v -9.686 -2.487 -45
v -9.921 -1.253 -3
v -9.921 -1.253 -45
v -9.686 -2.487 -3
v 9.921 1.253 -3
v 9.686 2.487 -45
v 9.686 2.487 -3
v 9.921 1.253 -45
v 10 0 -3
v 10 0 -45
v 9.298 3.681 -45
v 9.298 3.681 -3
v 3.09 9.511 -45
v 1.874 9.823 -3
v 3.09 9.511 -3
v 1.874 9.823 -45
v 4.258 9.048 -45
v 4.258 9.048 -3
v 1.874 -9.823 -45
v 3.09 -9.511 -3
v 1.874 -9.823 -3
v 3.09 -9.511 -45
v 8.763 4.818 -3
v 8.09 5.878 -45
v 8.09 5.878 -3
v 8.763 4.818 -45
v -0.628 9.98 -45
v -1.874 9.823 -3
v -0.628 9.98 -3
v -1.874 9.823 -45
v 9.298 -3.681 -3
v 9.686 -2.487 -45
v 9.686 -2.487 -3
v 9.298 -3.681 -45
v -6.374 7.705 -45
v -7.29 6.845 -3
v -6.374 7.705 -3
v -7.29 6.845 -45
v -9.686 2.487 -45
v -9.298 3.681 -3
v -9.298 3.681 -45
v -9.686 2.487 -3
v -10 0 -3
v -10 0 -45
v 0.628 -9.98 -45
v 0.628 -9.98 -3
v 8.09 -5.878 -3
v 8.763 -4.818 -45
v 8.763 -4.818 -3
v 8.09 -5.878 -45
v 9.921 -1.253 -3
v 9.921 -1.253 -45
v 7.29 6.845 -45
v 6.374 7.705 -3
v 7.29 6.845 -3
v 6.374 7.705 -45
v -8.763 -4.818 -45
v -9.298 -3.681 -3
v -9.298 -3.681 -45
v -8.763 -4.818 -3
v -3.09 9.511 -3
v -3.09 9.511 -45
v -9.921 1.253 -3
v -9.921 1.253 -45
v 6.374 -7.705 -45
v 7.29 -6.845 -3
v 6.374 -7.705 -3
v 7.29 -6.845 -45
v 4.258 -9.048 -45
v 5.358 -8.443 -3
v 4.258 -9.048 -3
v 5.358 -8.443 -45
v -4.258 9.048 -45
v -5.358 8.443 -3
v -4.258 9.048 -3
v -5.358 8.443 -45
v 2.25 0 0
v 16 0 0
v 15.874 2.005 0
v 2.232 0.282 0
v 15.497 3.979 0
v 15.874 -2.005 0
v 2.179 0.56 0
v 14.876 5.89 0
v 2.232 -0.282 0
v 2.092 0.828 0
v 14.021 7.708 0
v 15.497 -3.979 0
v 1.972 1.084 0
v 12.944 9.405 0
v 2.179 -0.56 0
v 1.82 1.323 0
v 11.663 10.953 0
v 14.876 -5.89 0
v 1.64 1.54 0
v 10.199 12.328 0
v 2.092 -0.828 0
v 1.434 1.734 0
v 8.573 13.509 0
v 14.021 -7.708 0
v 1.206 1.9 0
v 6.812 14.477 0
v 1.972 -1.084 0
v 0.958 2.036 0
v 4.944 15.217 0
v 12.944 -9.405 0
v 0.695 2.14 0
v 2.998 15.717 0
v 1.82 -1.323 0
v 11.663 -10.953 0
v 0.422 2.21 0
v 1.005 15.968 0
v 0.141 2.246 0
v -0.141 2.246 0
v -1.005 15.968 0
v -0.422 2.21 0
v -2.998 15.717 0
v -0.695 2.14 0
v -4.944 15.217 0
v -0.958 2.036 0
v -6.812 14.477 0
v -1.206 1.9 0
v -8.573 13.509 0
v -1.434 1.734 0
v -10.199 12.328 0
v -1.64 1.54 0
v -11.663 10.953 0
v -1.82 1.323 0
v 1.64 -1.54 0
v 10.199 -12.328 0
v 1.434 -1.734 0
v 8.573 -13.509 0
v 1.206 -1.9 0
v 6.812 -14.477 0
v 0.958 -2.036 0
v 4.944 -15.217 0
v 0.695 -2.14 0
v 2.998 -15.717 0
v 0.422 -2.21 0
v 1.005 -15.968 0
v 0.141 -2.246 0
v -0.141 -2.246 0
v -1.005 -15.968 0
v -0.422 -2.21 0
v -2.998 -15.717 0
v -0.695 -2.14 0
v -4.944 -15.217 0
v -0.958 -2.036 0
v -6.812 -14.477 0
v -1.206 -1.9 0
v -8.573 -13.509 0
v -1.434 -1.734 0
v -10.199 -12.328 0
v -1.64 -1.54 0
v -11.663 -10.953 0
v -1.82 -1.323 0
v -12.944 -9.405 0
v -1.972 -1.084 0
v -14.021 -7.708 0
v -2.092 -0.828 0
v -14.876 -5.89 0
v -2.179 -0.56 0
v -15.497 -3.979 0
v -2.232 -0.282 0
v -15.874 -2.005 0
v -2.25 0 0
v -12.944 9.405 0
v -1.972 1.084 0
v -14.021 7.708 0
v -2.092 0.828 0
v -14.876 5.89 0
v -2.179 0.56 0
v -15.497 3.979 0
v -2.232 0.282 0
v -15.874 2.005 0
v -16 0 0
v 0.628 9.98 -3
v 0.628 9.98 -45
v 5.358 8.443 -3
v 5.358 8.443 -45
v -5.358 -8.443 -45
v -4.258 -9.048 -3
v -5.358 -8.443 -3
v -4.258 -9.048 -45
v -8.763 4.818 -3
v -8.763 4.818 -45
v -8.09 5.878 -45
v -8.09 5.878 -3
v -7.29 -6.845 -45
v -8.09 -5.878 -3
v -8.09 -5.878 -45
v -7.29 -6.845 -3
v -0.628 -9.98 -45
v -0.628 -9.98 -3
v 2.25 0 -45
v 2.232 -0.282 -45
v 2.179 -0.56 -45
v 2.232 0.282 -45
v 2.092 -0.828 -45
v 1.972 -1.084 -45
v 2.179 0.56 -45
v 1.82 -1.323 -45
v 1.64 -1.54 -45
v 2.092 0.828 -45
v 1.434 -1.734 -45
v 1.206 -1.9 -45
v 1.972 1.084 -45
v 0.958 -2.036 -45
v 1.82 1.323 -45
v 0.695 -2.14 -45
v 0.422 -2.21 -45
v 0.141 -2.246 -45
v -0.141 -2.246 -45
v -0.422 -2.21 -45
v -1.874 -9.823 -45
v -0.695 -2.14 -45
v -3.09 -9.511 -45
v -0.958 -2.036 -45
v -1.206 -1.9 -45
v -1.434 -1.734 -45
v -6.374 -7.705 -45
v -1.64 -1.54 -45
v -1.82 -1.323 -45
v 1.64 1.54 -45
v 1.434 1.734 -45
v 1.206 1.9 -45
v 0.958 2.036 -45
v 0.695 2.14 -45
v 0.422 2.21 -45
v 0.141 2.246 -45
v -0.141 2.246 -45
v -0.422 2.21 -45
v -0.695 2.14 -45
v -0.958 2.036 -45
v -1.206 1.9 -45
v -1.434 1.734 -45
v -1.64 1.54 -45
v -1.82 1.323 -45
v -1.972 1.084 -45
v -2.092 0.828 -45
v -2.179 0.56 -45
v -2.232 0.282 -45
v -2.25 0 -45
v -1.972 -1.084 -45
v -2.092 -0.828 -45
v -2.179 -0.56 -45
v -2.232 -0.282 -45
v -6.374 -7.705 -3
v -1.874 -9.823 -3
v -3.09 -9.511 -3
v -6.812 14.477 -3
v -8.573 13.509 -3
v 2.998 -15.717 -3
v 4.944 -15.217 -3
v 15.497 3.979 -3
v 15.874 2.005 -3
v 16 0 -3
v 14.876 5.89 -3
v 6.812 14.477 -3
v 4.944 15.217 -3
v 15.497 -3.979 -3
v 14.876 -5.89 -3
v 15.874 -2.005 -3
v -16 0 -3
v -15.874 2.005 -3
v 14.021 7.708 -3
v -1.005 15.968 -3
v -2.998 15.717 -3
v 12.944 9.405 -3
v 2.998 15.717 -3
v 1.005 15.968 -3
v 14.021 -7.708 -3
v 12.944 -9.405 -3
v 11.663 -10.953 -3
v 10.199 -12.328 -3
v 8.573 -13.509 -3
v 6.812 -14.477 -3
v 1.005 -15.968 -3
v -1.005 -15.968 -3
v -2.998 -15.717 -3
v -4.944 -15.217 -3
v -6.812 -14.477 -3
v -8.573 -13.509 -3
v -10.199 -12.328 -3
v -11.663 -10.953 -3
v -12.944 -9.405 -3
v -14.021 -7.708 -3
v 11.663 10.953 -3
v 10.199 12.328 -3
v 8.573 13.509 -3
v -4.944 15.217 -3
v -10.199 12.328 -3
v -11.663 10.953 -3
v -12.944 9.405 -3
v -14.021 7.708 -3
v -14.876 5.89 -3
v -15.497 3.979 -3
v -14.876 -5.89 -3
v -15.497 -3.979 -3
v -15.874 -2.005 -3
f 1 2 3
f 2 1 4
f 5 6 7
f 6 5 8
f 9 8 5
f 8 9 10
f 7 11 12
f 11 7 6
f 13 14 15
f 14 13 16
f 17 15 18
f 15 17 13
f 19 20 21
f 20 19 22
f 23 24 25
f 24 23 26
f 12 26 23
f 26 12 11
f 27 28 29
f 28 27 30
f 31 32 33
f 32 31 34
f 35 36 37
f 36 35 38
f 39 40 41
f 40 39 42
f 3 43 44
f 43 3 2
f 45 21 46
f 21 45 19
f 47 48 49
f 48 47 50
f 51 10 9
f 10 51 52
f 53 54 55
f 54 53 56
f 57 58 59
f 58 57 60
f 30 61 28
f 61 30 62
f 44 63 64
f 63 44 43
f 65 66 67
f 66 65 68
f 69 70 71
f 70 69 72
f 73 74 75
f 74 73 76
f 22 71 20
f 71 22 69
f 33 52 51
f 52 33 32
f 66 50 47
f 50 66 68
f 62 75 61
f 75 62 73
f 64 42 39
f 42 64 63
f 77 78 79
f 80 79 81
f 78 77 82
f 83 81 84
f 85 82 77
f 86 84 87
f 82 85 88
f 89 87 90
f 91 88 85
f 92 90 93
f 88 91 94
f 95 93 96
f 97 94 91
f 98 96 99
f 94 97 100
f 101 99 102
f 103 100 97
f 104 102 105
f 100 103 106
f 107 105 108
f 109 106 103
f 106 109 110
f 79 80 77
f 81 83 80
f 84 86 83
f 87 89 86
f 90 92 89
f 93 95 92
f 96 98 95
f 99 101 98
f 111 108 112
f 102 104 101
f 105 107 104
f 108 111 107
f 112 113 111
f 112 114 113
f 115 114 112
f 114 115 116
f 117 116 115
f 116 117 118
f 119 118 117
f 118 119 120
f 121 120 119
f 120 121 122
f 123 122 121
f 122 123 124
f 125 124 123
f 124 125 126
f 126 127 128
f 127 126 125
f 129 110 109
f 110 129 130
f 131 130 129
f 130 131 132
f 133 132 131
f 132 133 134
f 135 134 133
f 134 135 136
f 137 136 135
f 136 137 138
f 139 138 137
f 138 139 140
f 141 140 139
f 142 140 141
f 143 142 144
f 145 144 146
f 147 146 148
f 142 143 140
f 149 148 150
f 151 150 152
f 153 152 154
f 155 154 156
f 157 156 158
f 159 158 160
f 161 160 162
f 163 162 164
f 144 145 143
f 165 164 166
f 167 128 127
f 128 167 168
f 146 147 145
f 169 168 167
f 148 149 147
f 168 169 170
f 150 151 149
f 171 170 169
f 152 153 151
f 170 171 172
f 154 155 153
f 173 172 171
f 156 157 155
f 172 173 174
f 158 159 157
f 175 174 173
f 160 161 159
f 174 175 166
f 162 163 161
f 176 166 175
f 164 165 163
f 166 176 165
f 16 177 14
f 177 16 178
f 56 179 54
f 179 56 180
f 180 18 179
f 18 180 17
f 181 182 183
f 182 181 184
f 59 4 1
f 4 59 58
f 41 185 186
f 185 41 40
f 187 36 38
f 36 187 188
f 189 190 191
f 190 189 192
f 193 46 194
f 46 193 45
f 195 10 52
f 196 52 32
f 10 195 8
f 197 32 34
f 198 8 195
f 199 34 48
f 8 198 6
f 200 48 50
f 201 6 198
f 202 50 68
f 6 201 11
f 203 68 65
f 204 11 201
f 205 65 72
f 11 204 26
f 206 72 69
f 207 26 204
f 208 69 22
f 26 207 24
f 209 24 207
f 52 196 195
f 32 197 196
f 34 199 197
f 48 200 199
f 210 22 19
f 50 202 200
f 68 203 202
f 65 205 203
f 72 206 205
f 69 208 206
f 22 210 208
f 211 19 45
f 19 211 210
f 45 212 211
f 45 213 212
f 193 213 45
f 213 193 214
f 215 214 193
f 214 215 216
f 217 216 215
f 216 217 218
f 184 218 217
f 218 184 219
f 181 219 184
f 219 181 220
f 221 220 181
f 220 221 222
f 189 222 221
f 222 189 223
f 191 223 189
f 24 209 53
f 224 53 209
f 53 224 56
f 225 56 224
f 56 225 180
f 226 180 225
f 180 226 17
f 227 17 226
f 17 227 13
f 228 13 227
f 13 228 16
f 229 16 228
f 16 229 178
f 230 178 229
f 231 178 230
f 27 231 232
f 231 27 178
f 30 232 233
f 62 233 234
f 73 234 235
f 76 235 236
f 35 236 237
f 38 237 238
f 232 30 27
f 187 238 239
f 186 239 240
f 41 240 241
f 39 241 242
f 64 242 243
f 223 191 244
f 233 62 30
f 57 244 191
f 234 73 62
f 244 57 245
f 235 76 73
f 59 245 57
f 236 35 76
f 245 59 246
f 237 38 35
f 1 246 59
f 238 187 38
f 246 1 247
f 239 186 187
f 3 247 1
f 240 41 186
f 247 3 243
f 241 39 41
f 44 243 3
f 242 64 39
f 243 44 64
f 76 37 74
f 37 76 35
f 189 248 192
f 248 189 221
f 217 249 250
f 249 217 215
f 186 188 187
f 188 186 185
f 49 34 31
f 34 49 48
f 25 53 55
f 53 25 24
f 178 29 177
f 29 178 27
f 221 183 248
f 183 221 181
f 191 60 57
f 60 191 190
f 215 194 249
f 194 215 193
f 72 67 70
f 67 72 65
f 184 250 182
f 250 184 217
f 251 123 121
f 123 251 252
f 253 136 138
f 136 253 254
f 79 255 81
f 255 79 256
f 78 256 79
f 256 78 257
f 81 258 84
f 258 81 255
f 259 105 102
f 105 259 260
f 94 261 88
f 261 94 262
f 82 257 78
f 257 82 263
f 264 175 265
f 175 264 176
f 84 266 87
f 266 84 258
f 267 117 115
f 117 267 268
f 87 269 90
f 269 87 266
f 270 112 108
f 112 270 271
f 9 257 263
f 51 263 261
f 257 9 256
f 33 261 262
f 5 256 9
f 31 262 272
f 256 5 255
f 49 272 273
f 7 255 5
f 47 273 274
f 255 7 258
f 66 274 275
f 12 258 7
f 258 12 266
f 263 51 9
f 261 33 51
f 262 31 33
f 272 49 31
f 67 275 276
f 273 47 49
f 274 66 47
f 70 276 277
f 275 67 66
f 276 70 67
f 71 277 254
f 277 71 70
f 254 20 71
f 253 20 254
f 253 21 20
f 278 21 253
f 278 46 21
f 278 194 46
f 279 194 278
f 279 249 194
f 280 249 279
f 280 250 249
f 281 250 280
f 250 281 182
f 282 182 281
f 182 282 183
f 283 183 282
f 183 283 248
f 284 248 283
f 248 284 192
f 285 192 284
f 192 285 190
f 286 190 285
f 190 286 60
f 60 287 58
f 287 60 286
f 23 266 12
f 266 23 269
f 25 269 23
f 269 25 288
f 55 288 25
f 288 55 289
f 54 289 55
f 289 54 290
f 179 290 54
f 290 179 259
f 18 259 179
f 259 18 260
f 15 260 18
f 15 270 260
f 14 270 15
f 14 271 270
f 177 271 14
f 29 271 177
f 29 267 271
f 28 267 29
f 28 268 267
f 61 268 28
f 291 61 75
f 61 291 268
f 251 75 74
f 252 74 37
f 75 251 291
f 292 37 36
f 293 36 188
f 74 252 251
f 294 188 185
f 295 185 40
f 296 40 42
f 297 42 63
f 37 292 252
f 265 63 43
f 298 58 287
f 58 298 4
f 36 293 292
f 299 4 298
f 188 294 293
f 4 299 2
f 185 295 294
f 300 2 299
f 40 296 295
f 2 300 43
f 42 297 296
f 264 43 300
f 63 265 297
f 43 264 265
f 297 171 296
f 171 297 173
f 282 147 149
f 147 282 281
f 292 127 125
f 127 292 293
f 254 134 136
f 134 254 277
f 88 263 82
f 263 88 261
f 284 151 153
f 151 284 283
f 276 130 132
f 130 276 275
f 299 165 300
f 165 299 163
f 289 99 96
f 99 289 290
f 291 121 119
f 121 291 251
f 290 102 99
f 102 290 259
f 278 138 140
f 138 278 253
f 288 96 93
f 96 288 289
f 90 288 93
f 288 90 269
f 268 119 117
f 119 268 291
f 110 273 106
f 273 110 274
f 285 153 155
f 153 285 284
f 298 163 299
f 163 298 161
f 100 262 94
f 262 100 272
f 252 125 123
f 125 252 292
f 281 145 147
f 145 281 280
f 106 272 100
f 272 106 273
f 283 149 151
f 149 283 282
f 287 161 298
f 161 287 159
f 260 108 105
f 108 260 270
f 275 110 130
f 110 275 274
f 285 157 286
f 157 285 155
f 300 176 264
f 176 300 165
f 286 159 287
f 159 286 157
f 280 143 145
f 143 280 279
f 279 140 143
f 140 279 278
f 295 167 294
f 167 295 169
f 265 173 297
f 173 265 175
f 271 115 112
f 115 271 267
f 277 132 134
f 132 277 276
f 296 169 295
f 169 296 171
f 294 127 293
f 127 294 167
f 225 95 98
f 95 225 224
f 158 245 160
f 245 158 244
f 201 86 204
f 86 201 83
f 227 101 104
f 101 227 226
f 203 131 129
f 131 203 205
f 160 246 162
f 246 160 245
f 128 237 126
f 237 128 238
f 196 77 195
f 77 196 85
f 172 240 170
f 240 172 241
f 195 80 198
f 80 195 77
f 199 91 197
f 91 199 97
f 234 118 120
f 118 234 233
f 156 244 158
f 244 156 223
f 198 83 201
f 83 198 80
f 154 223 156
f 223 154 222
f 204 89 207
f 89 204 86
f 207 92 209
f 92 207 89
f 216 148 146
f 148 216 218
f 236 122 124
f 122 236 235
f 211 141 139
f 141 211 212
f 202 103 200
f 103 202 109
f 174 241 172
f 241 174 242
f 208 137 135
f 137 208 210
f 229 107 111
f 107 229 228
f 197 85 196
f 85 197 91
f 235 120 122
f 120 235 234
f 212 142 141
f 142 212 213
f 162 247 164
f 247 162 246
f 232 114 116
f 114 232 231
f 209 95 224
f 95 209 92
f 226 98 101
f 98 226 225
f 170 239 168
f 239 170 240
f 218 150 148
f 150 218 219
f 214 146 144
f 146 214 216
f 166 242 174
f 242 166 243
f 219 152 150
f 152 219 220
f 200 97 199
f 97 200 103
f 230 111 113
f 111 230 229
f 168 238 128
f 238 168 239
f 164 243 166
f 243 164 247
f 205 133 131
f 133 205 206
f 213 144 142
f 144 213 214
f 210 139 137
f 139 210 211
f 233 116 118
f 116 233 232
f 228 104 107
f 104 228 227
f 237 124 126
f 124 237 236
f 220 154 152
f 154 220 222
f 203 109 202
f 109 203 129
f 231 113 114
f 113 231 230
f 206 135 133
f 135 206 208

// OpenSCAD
$fn = 50;


difference() {
	union() {
		translate(v = [0, 0, -45.0000000000]) {
			cylinder(h = 45, r = 10.0000000000);
		}
		translate(v = [0, 0, -3.0000000000]) {
			cylinder(h = 3, r = 16.0000000000);
		}
	}
	union() {
		#translate(v = [0, 0, -45]) {
			cylinder(h = 45, r = 2.2500000000);
		}
	}
}
